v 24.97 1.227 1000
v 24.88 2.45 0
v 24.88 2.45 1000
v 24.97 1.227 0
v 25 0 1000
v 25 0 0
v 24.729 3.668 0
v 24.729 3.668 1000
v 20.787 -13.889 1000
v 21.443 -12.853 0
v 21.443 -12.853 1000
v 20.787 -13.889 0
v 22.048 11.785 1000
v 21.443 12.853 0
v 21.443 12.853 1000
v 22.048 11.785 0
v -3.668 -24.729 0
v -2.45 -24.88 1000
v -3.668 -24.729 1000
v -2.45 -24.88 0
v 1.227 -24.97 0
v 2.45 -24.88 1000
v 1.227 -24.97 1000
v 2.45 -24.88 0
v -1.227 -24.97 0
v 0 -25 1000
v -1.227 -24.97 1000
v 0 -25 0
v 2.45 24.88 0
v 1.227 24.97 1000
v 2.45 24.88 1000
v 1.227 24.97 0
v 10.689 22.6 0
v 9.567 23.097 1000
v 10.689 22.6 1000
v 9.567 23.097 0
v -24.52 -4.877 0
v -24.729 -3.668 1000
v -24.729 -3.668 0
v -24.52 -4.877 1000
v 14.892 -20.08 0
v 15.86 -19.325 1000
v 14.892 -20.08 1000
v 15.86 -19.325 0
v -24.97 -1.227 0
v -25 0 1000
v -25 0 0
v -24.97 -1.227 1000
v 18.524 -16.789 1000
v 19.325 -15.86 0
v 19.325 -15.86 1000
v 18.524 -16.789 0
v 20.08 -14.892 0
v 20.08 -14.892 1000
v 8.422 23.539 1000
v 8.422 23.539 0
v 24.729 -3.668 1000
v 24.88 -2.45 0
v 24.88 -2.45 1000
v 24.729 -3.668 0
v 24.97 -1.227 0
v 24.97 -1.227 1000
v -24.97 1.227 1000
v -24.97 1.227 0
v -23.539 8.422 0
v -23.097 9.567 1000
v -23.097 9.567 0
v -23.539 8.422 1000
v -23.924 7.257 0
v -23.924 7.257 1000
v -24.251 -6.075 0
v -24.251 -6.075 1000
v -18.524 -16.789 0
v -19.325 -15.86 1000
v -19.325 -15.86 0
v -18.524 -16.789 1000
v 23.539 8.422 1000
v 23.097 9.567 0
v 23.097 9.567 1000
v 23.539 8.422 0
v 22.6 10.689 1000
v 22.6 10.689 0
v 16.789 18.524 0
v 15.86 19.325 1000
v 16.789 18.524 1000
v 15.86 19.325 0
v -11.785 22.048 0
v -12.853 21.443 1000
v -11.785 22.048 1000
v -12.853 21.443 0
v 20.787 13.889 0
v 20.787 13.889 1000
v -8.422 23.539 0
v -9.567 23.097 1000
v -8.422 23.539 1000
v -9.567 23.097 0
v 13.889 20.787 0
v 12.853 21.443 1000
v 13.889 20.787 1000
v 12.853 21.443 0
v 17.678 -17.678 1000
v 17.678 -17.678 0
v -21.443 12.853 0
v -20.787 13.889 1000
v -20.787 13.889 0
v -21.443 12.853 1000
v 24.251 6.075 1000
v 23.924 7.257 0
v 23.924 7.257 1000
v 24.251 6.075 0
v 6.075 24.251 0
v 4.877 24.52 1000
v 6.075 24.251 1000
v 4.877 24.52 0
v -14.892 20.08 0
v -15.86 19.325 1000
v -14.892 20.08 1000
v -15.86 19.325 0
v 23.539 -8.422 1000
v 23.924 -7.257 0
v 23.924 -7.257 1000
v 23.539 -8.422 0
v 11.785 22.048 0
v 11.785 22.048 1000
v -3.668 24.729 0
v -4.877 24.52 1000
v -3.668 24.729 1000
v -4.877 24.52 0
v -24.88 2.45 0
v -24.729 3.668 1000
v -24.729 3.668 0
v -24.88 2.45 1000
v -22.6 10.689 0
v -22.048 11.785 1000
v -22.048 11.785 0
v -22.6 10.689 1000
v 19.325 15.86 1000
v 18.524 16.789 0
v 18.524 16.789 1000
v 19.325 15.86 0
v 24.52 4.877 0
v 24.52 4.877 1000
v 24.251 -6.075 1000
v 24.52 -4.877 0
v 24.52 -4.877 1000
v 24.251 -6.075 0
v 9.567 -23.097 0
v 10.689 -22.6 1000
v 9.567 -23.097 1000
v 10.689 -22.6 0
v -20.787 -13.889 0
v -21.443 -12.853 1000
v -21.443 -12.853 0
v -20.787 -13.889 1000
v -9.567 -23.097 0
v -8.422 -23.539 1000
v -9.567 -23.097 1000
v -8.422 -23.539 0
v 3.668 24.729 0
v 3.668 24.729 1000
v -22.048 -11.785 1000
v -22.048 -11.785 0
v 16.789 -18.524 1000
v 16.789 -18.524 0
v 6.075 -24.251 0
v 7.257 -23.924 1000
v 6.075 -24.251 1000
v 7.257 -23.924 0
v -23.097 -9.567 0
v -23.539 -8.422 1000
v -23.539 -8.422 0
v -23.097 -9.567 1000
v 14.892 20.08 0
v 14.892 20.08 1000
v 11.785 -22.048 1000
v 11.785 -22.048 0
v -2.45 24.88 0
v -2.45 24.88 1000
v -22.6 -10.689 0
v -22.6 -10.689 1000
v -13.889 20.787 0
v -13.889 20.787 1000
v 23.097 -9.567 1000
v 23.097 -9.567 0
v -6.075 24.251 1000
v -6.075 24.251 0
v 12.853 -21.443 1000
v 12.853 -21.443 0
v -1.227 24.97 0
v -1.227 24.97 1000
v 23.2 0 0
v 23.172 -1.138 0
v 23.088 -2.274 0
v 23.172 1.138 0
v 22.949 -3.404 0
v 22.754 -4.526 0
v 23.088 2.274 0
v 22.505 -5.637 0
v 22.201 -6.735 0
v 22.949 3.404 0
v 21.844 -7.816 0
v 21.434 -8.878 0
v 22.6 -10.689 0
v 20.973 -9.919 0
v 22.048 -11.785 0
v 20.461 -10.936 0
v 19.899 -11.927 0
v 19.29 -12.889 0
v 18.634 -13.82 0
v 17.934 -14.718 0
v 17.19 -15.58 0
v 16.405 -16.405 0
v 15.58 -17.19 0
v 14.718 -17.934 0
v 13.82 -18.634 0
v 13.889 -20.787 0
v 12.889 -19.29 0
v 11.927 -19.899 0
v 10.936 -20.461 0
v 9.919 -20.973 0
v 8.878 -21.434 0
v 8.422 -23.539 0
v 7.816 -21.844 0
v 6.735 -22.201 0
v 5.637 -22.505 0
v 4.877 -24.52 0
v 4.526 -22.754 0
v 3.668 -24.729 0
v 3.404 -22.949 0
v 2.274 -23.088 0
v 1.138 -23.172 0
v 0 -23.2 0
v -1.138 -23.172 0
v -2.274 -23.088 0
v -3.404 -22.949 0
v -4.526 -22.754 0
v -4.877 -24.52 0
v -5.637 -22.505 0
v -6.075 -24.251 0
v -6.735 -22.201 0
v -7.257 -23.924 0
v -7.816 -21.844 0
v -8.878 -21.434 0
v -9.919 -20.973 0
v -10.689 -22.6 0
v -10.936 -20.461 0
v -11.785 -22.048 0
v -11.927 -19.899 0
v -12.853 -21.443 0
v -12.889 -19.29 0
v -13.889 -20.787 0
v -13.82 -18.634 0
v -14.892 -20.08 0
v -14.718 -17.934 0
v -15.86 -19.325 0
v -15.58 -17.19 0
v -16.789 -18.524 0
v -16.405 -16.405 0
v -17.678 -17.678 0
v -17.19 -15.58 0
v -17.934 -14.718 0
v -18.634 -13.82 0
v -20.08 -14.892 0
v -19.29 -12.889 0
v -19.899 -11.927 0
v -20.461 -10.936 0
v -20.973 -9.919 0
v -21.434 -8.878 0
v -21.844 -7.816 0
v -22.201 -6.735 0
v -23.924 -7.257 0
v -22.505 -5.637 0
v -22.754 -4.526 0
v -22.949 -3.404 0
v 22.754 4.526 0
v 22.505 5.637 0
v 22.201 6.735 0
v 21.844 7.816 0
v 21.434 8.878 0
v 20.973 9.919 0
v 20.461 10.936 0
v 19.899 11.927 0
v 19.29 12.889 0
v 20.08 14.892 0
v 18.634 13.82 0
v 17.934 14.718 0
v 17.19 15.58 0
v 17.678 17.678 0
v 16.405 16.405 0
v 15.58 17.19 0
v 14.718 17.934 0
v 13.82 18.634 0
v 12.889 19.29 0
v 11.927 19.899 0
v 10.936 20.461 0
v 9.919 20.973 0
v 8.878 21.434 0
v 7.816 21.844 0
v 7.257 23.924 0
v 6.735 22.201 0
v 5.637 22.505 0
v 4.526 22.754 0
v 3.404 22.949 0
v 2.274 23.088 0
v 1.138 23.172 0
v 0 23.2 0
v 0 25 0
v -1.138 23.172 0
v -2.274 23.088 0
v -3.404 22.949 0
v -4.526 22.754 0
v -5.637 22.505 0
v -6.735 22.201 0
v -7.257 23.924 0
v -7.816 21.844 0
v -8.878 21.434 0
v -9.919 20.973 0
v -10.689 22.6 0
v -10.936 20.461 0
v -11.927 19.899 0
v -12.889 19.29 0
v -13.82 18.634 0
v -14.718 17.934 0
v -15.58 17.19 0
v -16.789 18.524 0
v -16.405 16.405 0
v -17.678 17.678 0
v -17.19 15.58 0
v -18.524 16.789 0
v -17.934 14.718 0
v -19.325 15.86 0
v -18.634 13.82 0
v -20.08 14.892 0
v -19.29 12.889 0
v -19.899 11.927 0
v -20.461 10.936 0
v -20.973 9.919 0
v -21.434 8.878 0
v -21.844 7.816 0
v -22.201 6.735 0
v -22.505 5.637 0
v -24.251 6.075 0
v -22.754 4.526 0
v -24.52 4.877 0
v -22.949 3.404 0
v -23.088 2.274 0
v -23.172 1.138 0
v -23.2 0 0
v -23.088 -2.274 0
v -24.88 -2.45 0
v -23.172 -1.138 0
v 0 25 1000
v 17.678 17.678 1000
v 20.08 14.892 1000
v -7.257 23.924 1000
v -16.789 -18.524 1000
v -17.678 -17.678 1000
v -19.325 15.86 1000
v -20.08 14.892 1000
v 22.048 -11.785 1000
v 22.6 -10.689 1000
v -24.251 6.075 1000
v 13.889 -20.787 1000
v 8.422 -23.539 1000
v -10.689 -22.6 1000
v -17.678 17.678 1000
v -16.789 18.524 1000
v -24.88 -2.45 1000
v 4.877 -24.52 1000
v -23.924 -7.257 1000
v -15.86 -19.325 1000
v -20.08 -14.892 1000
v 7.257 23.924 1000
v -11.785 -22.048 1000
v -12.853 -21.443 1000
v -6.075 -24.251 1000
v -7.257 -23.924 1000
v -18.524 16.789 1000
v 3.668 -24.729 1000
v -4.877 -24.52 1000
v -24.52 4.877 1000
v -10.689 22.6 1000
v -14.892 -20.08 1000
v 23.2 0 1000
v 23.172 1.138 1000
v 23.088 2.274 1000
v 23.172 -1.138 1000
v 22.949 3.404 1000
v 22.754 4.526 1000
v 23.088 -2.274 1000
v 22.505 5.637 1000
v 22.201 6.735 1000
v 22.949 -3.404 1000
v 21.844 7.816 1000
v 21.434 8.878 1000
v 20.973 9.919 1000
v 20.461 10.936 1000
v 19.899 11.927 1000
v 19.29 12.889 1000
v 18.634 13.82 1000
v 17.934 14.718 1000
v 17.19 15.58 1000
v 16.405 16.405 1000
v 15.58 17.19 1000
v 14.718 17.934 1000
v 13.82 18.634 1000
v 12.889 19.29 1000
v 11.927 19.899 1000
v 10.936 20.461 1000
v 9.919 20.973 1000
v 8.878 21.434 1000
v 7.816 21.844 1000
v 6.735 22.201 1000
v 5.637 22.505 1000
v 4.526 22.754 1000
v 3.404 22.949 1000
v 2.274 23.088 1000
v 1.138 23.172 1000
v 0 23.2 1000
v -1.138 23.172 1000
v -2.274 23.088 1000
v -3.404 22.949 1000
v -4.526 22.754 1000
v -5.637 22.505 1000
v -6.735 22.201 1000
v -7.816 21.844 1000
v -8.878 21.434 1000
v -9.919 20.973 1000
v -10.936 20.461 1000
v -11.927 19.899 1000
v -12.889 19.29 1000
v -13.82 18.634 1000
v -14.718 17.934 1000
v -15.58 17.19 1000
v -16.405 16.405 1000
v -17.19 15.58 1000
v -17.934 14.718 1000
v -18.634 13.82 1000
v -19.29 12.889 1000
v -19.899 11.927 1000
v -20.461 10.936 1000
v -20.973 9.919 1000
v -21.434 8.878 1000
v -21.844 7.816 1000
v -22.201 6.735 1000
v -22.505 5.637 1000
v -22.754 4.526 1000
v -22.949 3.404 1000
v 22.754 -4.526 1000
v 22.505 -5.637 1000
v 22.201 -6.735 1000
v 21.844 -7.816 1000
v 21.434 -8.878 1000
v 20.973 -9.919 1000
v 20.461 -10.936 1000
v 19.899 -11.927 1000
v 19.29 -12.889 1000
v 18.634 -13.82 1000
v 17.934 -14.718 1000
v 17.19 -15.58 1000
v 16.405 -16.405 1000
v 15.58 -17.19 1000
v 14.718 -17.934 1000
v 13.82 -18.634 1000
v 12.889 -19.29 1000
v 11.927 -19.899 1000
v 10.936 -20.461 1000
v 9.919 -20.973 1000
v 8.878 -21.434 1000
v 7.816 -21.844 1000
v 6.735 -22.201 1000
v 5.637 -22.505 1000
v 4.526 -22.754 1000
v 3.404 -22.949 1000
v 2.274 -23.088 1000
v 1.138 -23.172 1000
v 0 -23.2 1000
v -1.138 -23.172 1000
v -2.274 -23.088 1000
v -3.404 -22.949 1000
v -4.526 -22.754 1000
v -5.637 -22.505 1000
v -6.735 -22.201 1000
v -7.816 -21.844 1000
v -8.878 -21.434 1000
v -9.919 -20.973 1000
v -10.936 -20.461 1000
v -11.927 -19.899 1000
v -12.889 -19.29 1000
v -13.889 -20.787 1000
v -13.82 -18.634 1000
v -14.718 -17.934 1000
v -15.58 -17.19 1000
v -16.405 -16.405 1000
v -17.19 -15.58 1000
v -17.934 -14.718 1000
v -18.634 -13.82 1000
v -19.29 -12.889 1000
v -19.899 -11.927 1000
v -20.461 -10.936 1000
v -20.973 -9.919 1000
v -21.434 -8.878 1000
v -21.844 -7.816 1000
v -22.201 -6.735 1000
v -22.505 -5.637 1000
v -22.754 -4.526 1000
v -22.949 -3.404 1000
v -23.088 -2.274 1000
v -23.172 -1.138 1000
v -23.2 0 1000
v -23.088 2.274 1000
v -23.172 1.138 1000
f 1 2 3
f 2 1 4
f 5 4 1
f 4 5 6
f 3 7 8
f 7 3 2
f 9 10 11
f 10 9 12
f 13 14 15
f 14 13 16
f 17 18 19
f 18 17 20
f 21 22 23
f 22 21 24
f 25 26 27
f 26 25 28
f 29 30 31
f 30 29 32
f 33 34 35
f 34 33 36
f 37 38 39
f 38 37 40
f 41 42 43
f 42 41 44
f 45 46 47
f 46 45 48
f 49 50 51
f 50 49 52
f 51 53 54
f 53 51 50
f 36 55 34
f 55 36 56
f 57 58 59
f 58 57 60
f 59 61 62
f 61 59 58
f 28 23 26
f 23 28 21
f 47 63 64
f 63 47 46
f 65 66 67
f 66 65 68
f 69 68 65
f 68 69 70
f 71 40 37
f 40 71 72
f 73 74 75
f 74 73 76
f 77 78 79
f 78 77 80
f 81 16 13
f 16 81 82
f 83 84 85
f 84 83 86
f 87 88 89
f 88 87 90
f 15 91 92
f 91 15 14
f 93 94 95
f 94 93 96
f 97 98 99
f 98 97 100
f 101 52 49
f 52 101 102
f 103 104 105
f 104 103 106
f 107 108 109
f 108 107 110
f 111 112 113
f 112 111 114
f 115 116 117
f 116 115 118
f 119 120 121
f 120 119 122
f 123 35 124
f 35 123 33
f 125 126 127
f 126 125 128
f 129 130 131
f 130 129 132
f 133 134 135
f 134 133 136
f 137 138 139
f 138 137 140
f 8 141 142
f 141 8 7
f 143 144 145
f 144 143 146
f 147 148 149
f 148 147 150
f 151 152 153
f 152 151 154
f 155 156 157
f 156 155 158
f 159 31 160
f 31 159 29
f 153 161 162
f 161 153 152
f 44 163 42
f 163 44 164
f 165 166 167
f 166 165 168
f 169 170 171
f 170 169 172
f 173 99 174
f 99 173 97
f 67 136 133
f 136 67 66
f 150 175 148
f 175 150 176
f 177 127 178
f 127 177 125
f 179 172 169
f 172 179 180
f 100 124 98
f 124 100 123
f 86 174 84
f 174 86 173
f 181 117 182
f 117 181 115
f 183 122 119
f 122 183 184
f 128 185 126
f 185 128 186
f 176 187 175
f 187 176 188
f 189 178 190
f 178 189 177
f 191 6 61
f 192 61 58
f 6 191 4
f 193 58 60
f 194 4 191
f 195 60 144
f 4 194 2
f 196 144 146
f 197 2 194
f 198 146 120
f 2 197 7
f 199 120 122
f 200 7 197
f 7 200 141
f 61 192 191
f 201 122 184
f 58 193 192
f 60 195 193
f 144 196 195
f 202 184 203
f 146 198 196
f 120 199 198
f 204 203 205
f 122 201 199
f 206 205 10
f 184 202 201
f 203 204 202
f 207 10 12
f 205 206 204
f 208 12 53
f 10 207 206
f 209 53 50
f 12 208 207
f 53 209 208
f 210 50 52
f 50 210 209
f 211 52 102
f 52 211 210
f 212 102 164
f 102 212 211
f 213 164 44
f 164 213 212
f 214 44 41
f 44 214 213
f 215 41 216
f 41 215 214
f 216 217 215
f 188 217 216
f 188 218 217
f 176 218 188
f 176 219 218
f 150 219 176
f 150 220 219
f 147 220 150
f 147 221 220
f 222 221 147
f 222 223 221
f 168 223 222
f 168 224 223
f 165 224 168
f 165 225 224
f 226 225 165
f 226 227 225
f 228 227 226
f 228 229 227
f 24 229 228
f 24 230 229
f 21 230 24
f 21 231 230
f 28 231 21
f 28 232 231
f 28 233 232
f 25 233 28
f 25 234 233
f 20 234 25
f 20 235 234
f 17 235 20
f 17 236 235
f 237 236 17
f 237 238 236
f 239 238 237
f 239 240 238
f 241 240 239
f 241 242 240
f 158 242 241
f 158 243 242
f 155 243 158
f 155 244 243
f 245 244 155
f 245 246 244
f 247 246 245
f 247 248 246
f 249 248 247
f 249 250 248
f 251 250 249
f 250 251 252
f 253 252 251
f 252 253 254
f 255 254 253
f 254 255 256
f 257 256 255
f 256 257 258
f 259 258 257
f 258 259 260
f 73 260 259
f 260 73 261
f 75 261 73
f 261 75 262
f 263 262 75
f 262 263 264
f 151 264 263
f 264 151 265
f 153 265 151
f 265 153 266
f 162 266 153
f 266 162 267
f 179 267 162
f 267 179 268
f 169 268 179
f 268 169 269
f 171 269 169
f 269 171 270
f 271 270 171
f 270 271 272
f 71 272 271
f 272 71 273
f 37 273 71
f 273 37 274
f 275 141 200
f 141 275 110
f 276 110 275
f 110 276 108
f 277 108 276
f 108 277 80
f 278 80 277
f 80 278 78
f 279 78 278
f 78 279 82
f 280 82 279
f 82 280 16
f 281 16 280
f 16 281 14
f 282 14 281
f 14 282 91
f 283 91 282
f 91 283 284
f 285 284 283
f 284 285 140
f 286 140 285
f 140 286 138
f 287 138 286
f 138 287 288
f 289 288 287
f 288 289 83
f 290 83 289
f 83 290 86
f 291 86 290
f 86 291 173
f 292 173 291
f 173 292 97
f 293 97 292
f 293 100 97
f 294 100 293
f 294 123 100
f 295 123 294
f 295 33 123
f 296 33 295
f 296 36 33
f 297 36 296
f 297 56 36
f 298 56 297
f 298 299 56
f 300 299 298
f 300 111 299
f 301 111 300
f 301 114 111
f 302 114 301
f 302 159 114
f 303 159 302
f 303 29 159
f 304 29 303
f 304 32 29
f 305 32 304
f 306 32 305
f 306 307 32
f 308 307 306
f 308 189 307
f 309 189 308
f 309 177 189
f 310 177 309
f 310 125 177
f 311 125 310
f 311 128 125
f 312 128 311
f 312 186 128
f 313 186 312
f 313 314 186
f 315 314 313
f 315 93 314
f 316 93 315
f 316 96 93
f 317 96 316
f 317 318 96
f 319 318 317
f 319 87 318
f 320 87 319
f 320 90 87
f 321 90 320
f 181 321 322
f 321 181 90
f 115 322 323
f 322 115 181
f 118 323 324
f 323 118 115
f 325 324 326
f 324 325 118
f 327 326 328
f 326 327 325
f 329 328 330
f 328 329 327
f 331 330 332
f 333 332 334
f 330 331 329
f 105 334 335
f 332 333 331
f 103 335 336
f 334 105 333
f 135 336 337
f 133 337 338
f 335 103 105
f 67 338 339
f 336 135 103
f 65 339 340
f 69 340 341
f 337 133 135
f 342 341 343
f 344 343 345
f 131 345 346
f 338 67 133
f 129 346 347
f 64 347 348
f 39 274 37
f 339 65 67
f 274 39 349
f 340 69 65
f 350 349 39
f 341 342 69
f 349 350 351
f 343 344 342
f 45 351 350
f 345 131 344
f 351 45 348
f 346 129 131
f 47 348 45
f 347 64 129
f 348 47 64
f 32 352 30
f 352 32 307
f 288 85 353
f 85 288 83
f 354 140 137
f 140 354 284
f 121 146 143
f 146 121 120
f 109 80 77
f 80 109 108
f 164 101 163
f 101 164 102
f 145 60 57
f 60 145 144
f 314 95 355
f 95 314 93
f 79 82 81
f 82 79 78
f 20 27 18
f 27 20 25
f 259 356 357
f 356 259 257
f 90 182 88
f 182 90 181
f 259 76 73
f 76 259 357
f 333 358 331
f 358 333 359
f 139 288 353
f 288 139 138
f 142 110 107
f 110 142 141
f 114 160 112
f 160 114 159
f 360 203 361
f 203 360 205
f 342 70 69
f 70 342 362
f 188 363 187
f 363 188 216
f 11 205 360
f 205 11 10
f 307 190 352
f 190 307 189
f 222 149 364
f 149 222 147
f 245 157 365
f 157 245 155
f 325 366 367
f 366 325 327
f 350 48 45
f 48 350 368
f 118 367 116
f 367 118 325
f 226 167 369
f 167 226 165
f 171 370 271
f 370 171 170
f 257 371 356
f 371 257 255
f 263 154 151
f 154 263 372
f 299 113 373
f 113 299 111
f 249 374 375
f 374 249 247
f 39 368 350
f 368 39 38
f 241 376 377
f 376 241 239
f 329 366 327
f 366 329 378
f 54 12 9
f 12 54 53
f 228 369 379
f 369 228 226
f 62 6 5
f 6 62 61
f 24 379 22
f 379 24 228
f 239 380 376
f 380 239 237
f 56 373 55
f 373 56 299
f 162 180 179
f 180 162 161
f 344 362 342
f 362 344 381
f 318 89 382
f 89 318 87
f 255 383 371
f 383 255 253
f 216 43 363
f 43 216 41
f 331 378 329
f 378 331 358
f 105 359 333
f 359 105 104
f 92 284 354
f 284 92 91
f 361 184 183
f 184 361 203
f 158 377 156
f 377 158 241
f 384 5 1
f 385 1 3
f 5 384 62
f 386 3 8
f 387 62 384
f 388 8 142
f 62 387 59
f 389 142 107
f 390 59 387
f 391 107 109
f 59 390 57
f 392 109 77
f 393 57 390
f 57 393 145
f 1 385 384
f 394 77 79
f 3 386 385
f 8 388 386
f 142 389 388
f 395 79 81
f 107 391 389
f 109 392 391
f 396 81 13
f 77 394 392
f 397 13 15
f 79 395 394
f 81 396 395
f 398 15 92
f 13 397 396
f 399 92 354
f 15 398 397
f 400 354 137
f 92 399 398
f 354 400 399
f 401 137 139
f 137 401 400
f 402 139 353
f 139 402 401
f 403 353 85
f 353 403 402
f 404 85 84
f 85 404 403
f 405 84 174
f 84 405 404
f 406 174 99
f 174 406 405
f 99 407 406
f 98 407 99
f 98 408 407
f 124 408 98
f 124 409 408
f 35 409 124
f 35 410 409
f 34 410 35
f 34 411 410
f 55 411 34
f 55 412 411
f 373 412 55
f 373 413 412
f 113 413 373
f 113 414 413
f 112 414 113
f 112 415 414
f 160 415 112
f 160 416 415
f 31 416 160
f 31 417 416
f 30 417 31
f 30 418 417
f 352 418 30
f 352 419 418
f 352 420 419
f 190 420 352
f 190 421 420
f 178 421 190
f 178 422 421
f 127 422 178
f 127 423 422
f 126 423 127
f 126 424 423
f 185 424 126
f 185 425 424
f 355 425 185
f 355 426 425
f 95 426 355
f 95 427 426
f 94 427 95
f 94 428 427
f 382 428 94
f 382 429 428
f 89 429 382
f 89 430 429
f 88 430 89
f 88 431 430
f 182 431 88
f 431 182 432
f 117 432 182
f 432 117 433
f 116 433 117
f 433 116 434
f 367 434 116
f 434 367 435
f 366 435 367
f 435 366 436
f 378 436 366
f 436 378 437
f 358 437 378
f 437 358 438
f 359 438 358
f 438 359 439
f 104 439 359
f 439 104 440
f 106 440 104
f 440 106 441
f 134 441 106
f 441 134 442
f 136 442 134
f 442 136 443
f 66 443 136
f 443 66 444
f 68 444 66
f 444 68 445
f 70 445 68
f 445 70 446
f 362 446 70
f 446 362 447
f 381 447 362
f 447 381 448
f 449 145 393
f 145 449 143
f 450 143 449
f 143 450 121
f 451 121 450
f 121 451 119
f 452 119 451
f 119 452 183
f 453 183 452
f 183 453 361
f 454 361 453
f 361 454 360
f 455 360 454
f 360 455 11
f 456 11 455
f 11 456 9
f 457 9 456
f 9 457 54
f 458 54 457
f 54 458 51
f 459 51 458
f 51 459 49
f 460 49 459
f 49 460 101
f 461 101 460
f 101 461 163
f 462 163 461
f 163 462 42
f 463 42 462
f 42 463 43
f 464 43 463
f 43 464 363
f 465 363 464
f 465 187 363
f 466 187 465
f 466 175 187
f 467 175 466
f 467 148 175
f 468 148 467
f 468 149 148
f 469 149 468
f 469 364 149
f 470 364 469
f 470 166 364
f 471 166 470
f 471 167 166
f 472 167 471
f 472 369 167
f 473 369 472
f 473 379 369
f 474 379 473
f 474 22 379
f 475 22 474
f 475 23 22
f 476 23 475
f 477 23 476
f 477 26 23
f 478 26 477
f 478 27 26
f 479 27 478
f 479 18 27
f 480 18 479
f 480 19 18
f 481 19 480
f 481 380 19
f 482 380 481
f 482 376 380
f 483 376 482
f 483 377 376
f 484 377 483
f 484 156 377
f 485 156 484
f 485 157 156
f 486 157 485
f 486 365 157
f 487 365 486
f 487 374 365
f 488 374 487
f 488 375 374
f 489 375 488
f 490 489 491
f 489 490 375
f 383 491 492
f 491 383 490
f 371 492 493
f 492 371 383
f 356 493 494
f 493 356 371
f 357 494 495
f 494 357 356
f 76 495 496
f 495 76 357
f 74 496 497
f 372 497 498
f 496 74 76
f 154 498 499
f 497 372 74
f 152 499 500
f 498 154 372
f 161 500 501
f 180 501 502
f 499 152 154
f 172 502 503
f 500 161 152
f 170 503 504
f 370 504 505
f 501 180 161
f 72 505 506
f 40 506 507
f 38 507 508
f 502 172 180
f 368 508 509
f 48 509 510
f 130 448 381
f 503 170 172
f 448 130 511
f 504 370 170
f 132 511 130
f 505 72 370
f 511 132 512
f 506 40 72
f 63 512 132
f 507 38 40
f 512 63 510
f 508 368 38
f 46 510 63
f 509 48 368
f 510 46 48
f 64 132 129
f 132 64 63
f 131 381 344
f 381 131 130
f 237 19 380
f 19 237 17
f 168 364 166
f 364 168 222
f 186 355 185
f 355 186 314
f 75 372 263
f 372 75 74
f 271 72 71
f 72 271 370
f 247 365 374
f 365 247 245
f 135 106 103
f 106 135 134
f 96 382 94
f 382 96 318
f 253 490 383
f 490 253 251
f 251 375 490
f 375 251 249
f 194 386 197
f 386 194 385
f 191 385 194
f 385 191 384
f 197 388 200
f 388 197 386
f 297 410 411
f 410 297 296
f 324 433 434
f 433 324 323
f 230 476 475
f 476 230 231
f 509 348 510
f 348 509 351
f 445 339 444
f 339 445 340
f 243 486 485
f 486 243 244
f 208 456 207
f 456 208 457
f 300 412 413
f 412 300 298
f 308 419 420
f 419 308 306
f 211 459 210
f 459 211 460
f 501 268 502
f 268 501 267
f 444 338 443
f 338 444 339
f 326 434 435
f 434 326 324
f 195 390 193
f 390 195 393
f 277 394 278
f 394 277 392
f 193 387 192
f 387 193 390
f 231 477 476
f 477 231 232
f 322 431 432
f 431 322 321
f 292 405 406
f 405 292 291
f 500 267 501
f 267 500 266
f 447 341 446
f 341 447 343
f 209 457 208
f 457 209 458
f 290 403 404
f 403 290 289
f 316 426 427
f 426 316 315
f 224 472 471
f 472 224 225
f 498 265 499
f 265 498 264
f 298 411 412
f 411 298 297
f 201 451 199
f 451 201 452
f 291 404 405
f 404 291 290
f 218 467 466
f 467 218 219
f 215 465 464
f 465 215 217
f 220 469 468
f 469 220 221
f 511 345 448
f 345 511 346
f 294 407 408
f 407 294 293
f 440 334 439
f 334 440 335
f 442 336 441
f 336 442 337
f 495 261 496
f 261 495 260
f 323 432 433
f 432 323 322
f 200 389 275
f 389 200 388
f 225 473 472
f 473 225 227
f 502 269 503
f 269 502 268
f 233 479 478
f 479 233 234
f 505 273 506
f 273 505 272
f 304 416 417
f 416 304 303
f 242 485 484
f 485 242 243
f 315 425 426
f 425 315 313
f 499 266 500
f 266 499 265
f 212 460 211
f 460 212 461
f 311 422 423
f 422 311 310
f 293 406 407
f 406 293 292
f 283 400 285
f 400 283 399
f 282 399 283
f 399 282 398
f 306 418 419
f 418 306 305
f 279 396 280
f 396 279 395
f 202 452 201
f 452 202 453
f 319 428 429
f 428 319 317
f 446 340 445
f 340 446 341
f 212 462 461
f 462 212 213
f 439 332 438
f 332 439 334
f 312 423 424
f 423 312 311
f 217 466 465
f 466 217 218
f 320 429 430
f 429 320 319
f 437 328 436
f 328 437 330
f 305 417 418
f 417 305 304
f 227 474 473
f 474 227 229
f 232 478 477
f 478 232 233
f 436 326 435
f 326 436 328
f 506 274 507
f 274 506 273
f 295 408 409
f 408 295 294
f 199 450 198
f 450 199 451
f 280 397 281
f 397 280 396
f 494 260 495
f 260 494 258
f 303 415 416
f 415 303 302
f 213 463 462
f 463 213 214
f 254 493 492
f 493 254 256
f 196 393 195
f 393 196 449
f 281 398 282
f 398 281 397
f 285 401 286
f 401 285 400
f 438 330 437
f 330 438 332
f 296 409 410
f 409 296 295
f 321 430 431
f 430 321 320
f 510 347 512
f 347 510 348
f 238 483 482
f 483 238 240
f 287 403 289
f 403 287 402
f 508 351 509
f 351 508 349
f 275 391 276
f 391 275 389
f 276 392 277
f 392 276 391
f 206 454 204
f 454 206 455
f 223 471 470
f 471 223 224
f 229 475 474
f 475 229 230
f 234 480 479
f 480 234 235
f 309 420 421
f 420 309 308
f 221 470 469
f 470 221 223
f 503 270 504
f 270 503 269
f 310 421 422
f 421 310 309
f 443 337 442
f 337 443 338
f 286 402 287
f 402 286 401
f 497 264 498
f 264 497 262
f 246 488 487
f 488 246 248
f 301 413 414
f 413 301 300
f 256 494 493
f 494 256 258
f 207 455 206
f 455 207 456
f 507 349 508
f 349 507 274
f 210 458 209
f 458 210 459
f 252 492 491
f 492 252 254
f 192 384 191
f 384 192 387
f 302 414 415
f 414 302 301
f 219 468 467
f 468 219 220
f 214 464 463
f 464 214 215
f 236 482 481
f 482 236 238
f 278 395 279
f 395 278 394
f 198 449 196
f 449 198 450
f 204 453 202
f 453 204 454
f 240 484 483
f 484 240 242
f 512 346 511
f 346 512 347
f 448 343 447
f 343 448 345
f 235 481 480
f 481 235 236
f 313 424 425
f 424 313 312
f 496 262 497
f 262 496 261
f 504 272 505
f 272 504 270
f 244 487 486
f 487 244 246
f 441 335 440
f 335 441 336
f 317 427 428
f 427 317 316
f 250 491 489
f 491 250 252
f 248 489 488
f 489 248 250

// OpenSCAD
$fn = 128;

// HT 50 pipe (approx.): DN 50, length 1000 mm
// Typical HT 50 dimensions (approx):
// - Outer diameter: 50 mm
// - Wall thickness: 1.8 mm
// Adjust as needed.

od = 50;
wall = 1.8;
id = od - 2*wall;
len = 1000;

module ht_pipe(od, id, len) {
    difference() {
        cylinder(h=len, d=od);
        translate([0,0,-0.5])
            cylinder(h=len+1, d=id);
    }
}

ht_pipe(od, id, len);
